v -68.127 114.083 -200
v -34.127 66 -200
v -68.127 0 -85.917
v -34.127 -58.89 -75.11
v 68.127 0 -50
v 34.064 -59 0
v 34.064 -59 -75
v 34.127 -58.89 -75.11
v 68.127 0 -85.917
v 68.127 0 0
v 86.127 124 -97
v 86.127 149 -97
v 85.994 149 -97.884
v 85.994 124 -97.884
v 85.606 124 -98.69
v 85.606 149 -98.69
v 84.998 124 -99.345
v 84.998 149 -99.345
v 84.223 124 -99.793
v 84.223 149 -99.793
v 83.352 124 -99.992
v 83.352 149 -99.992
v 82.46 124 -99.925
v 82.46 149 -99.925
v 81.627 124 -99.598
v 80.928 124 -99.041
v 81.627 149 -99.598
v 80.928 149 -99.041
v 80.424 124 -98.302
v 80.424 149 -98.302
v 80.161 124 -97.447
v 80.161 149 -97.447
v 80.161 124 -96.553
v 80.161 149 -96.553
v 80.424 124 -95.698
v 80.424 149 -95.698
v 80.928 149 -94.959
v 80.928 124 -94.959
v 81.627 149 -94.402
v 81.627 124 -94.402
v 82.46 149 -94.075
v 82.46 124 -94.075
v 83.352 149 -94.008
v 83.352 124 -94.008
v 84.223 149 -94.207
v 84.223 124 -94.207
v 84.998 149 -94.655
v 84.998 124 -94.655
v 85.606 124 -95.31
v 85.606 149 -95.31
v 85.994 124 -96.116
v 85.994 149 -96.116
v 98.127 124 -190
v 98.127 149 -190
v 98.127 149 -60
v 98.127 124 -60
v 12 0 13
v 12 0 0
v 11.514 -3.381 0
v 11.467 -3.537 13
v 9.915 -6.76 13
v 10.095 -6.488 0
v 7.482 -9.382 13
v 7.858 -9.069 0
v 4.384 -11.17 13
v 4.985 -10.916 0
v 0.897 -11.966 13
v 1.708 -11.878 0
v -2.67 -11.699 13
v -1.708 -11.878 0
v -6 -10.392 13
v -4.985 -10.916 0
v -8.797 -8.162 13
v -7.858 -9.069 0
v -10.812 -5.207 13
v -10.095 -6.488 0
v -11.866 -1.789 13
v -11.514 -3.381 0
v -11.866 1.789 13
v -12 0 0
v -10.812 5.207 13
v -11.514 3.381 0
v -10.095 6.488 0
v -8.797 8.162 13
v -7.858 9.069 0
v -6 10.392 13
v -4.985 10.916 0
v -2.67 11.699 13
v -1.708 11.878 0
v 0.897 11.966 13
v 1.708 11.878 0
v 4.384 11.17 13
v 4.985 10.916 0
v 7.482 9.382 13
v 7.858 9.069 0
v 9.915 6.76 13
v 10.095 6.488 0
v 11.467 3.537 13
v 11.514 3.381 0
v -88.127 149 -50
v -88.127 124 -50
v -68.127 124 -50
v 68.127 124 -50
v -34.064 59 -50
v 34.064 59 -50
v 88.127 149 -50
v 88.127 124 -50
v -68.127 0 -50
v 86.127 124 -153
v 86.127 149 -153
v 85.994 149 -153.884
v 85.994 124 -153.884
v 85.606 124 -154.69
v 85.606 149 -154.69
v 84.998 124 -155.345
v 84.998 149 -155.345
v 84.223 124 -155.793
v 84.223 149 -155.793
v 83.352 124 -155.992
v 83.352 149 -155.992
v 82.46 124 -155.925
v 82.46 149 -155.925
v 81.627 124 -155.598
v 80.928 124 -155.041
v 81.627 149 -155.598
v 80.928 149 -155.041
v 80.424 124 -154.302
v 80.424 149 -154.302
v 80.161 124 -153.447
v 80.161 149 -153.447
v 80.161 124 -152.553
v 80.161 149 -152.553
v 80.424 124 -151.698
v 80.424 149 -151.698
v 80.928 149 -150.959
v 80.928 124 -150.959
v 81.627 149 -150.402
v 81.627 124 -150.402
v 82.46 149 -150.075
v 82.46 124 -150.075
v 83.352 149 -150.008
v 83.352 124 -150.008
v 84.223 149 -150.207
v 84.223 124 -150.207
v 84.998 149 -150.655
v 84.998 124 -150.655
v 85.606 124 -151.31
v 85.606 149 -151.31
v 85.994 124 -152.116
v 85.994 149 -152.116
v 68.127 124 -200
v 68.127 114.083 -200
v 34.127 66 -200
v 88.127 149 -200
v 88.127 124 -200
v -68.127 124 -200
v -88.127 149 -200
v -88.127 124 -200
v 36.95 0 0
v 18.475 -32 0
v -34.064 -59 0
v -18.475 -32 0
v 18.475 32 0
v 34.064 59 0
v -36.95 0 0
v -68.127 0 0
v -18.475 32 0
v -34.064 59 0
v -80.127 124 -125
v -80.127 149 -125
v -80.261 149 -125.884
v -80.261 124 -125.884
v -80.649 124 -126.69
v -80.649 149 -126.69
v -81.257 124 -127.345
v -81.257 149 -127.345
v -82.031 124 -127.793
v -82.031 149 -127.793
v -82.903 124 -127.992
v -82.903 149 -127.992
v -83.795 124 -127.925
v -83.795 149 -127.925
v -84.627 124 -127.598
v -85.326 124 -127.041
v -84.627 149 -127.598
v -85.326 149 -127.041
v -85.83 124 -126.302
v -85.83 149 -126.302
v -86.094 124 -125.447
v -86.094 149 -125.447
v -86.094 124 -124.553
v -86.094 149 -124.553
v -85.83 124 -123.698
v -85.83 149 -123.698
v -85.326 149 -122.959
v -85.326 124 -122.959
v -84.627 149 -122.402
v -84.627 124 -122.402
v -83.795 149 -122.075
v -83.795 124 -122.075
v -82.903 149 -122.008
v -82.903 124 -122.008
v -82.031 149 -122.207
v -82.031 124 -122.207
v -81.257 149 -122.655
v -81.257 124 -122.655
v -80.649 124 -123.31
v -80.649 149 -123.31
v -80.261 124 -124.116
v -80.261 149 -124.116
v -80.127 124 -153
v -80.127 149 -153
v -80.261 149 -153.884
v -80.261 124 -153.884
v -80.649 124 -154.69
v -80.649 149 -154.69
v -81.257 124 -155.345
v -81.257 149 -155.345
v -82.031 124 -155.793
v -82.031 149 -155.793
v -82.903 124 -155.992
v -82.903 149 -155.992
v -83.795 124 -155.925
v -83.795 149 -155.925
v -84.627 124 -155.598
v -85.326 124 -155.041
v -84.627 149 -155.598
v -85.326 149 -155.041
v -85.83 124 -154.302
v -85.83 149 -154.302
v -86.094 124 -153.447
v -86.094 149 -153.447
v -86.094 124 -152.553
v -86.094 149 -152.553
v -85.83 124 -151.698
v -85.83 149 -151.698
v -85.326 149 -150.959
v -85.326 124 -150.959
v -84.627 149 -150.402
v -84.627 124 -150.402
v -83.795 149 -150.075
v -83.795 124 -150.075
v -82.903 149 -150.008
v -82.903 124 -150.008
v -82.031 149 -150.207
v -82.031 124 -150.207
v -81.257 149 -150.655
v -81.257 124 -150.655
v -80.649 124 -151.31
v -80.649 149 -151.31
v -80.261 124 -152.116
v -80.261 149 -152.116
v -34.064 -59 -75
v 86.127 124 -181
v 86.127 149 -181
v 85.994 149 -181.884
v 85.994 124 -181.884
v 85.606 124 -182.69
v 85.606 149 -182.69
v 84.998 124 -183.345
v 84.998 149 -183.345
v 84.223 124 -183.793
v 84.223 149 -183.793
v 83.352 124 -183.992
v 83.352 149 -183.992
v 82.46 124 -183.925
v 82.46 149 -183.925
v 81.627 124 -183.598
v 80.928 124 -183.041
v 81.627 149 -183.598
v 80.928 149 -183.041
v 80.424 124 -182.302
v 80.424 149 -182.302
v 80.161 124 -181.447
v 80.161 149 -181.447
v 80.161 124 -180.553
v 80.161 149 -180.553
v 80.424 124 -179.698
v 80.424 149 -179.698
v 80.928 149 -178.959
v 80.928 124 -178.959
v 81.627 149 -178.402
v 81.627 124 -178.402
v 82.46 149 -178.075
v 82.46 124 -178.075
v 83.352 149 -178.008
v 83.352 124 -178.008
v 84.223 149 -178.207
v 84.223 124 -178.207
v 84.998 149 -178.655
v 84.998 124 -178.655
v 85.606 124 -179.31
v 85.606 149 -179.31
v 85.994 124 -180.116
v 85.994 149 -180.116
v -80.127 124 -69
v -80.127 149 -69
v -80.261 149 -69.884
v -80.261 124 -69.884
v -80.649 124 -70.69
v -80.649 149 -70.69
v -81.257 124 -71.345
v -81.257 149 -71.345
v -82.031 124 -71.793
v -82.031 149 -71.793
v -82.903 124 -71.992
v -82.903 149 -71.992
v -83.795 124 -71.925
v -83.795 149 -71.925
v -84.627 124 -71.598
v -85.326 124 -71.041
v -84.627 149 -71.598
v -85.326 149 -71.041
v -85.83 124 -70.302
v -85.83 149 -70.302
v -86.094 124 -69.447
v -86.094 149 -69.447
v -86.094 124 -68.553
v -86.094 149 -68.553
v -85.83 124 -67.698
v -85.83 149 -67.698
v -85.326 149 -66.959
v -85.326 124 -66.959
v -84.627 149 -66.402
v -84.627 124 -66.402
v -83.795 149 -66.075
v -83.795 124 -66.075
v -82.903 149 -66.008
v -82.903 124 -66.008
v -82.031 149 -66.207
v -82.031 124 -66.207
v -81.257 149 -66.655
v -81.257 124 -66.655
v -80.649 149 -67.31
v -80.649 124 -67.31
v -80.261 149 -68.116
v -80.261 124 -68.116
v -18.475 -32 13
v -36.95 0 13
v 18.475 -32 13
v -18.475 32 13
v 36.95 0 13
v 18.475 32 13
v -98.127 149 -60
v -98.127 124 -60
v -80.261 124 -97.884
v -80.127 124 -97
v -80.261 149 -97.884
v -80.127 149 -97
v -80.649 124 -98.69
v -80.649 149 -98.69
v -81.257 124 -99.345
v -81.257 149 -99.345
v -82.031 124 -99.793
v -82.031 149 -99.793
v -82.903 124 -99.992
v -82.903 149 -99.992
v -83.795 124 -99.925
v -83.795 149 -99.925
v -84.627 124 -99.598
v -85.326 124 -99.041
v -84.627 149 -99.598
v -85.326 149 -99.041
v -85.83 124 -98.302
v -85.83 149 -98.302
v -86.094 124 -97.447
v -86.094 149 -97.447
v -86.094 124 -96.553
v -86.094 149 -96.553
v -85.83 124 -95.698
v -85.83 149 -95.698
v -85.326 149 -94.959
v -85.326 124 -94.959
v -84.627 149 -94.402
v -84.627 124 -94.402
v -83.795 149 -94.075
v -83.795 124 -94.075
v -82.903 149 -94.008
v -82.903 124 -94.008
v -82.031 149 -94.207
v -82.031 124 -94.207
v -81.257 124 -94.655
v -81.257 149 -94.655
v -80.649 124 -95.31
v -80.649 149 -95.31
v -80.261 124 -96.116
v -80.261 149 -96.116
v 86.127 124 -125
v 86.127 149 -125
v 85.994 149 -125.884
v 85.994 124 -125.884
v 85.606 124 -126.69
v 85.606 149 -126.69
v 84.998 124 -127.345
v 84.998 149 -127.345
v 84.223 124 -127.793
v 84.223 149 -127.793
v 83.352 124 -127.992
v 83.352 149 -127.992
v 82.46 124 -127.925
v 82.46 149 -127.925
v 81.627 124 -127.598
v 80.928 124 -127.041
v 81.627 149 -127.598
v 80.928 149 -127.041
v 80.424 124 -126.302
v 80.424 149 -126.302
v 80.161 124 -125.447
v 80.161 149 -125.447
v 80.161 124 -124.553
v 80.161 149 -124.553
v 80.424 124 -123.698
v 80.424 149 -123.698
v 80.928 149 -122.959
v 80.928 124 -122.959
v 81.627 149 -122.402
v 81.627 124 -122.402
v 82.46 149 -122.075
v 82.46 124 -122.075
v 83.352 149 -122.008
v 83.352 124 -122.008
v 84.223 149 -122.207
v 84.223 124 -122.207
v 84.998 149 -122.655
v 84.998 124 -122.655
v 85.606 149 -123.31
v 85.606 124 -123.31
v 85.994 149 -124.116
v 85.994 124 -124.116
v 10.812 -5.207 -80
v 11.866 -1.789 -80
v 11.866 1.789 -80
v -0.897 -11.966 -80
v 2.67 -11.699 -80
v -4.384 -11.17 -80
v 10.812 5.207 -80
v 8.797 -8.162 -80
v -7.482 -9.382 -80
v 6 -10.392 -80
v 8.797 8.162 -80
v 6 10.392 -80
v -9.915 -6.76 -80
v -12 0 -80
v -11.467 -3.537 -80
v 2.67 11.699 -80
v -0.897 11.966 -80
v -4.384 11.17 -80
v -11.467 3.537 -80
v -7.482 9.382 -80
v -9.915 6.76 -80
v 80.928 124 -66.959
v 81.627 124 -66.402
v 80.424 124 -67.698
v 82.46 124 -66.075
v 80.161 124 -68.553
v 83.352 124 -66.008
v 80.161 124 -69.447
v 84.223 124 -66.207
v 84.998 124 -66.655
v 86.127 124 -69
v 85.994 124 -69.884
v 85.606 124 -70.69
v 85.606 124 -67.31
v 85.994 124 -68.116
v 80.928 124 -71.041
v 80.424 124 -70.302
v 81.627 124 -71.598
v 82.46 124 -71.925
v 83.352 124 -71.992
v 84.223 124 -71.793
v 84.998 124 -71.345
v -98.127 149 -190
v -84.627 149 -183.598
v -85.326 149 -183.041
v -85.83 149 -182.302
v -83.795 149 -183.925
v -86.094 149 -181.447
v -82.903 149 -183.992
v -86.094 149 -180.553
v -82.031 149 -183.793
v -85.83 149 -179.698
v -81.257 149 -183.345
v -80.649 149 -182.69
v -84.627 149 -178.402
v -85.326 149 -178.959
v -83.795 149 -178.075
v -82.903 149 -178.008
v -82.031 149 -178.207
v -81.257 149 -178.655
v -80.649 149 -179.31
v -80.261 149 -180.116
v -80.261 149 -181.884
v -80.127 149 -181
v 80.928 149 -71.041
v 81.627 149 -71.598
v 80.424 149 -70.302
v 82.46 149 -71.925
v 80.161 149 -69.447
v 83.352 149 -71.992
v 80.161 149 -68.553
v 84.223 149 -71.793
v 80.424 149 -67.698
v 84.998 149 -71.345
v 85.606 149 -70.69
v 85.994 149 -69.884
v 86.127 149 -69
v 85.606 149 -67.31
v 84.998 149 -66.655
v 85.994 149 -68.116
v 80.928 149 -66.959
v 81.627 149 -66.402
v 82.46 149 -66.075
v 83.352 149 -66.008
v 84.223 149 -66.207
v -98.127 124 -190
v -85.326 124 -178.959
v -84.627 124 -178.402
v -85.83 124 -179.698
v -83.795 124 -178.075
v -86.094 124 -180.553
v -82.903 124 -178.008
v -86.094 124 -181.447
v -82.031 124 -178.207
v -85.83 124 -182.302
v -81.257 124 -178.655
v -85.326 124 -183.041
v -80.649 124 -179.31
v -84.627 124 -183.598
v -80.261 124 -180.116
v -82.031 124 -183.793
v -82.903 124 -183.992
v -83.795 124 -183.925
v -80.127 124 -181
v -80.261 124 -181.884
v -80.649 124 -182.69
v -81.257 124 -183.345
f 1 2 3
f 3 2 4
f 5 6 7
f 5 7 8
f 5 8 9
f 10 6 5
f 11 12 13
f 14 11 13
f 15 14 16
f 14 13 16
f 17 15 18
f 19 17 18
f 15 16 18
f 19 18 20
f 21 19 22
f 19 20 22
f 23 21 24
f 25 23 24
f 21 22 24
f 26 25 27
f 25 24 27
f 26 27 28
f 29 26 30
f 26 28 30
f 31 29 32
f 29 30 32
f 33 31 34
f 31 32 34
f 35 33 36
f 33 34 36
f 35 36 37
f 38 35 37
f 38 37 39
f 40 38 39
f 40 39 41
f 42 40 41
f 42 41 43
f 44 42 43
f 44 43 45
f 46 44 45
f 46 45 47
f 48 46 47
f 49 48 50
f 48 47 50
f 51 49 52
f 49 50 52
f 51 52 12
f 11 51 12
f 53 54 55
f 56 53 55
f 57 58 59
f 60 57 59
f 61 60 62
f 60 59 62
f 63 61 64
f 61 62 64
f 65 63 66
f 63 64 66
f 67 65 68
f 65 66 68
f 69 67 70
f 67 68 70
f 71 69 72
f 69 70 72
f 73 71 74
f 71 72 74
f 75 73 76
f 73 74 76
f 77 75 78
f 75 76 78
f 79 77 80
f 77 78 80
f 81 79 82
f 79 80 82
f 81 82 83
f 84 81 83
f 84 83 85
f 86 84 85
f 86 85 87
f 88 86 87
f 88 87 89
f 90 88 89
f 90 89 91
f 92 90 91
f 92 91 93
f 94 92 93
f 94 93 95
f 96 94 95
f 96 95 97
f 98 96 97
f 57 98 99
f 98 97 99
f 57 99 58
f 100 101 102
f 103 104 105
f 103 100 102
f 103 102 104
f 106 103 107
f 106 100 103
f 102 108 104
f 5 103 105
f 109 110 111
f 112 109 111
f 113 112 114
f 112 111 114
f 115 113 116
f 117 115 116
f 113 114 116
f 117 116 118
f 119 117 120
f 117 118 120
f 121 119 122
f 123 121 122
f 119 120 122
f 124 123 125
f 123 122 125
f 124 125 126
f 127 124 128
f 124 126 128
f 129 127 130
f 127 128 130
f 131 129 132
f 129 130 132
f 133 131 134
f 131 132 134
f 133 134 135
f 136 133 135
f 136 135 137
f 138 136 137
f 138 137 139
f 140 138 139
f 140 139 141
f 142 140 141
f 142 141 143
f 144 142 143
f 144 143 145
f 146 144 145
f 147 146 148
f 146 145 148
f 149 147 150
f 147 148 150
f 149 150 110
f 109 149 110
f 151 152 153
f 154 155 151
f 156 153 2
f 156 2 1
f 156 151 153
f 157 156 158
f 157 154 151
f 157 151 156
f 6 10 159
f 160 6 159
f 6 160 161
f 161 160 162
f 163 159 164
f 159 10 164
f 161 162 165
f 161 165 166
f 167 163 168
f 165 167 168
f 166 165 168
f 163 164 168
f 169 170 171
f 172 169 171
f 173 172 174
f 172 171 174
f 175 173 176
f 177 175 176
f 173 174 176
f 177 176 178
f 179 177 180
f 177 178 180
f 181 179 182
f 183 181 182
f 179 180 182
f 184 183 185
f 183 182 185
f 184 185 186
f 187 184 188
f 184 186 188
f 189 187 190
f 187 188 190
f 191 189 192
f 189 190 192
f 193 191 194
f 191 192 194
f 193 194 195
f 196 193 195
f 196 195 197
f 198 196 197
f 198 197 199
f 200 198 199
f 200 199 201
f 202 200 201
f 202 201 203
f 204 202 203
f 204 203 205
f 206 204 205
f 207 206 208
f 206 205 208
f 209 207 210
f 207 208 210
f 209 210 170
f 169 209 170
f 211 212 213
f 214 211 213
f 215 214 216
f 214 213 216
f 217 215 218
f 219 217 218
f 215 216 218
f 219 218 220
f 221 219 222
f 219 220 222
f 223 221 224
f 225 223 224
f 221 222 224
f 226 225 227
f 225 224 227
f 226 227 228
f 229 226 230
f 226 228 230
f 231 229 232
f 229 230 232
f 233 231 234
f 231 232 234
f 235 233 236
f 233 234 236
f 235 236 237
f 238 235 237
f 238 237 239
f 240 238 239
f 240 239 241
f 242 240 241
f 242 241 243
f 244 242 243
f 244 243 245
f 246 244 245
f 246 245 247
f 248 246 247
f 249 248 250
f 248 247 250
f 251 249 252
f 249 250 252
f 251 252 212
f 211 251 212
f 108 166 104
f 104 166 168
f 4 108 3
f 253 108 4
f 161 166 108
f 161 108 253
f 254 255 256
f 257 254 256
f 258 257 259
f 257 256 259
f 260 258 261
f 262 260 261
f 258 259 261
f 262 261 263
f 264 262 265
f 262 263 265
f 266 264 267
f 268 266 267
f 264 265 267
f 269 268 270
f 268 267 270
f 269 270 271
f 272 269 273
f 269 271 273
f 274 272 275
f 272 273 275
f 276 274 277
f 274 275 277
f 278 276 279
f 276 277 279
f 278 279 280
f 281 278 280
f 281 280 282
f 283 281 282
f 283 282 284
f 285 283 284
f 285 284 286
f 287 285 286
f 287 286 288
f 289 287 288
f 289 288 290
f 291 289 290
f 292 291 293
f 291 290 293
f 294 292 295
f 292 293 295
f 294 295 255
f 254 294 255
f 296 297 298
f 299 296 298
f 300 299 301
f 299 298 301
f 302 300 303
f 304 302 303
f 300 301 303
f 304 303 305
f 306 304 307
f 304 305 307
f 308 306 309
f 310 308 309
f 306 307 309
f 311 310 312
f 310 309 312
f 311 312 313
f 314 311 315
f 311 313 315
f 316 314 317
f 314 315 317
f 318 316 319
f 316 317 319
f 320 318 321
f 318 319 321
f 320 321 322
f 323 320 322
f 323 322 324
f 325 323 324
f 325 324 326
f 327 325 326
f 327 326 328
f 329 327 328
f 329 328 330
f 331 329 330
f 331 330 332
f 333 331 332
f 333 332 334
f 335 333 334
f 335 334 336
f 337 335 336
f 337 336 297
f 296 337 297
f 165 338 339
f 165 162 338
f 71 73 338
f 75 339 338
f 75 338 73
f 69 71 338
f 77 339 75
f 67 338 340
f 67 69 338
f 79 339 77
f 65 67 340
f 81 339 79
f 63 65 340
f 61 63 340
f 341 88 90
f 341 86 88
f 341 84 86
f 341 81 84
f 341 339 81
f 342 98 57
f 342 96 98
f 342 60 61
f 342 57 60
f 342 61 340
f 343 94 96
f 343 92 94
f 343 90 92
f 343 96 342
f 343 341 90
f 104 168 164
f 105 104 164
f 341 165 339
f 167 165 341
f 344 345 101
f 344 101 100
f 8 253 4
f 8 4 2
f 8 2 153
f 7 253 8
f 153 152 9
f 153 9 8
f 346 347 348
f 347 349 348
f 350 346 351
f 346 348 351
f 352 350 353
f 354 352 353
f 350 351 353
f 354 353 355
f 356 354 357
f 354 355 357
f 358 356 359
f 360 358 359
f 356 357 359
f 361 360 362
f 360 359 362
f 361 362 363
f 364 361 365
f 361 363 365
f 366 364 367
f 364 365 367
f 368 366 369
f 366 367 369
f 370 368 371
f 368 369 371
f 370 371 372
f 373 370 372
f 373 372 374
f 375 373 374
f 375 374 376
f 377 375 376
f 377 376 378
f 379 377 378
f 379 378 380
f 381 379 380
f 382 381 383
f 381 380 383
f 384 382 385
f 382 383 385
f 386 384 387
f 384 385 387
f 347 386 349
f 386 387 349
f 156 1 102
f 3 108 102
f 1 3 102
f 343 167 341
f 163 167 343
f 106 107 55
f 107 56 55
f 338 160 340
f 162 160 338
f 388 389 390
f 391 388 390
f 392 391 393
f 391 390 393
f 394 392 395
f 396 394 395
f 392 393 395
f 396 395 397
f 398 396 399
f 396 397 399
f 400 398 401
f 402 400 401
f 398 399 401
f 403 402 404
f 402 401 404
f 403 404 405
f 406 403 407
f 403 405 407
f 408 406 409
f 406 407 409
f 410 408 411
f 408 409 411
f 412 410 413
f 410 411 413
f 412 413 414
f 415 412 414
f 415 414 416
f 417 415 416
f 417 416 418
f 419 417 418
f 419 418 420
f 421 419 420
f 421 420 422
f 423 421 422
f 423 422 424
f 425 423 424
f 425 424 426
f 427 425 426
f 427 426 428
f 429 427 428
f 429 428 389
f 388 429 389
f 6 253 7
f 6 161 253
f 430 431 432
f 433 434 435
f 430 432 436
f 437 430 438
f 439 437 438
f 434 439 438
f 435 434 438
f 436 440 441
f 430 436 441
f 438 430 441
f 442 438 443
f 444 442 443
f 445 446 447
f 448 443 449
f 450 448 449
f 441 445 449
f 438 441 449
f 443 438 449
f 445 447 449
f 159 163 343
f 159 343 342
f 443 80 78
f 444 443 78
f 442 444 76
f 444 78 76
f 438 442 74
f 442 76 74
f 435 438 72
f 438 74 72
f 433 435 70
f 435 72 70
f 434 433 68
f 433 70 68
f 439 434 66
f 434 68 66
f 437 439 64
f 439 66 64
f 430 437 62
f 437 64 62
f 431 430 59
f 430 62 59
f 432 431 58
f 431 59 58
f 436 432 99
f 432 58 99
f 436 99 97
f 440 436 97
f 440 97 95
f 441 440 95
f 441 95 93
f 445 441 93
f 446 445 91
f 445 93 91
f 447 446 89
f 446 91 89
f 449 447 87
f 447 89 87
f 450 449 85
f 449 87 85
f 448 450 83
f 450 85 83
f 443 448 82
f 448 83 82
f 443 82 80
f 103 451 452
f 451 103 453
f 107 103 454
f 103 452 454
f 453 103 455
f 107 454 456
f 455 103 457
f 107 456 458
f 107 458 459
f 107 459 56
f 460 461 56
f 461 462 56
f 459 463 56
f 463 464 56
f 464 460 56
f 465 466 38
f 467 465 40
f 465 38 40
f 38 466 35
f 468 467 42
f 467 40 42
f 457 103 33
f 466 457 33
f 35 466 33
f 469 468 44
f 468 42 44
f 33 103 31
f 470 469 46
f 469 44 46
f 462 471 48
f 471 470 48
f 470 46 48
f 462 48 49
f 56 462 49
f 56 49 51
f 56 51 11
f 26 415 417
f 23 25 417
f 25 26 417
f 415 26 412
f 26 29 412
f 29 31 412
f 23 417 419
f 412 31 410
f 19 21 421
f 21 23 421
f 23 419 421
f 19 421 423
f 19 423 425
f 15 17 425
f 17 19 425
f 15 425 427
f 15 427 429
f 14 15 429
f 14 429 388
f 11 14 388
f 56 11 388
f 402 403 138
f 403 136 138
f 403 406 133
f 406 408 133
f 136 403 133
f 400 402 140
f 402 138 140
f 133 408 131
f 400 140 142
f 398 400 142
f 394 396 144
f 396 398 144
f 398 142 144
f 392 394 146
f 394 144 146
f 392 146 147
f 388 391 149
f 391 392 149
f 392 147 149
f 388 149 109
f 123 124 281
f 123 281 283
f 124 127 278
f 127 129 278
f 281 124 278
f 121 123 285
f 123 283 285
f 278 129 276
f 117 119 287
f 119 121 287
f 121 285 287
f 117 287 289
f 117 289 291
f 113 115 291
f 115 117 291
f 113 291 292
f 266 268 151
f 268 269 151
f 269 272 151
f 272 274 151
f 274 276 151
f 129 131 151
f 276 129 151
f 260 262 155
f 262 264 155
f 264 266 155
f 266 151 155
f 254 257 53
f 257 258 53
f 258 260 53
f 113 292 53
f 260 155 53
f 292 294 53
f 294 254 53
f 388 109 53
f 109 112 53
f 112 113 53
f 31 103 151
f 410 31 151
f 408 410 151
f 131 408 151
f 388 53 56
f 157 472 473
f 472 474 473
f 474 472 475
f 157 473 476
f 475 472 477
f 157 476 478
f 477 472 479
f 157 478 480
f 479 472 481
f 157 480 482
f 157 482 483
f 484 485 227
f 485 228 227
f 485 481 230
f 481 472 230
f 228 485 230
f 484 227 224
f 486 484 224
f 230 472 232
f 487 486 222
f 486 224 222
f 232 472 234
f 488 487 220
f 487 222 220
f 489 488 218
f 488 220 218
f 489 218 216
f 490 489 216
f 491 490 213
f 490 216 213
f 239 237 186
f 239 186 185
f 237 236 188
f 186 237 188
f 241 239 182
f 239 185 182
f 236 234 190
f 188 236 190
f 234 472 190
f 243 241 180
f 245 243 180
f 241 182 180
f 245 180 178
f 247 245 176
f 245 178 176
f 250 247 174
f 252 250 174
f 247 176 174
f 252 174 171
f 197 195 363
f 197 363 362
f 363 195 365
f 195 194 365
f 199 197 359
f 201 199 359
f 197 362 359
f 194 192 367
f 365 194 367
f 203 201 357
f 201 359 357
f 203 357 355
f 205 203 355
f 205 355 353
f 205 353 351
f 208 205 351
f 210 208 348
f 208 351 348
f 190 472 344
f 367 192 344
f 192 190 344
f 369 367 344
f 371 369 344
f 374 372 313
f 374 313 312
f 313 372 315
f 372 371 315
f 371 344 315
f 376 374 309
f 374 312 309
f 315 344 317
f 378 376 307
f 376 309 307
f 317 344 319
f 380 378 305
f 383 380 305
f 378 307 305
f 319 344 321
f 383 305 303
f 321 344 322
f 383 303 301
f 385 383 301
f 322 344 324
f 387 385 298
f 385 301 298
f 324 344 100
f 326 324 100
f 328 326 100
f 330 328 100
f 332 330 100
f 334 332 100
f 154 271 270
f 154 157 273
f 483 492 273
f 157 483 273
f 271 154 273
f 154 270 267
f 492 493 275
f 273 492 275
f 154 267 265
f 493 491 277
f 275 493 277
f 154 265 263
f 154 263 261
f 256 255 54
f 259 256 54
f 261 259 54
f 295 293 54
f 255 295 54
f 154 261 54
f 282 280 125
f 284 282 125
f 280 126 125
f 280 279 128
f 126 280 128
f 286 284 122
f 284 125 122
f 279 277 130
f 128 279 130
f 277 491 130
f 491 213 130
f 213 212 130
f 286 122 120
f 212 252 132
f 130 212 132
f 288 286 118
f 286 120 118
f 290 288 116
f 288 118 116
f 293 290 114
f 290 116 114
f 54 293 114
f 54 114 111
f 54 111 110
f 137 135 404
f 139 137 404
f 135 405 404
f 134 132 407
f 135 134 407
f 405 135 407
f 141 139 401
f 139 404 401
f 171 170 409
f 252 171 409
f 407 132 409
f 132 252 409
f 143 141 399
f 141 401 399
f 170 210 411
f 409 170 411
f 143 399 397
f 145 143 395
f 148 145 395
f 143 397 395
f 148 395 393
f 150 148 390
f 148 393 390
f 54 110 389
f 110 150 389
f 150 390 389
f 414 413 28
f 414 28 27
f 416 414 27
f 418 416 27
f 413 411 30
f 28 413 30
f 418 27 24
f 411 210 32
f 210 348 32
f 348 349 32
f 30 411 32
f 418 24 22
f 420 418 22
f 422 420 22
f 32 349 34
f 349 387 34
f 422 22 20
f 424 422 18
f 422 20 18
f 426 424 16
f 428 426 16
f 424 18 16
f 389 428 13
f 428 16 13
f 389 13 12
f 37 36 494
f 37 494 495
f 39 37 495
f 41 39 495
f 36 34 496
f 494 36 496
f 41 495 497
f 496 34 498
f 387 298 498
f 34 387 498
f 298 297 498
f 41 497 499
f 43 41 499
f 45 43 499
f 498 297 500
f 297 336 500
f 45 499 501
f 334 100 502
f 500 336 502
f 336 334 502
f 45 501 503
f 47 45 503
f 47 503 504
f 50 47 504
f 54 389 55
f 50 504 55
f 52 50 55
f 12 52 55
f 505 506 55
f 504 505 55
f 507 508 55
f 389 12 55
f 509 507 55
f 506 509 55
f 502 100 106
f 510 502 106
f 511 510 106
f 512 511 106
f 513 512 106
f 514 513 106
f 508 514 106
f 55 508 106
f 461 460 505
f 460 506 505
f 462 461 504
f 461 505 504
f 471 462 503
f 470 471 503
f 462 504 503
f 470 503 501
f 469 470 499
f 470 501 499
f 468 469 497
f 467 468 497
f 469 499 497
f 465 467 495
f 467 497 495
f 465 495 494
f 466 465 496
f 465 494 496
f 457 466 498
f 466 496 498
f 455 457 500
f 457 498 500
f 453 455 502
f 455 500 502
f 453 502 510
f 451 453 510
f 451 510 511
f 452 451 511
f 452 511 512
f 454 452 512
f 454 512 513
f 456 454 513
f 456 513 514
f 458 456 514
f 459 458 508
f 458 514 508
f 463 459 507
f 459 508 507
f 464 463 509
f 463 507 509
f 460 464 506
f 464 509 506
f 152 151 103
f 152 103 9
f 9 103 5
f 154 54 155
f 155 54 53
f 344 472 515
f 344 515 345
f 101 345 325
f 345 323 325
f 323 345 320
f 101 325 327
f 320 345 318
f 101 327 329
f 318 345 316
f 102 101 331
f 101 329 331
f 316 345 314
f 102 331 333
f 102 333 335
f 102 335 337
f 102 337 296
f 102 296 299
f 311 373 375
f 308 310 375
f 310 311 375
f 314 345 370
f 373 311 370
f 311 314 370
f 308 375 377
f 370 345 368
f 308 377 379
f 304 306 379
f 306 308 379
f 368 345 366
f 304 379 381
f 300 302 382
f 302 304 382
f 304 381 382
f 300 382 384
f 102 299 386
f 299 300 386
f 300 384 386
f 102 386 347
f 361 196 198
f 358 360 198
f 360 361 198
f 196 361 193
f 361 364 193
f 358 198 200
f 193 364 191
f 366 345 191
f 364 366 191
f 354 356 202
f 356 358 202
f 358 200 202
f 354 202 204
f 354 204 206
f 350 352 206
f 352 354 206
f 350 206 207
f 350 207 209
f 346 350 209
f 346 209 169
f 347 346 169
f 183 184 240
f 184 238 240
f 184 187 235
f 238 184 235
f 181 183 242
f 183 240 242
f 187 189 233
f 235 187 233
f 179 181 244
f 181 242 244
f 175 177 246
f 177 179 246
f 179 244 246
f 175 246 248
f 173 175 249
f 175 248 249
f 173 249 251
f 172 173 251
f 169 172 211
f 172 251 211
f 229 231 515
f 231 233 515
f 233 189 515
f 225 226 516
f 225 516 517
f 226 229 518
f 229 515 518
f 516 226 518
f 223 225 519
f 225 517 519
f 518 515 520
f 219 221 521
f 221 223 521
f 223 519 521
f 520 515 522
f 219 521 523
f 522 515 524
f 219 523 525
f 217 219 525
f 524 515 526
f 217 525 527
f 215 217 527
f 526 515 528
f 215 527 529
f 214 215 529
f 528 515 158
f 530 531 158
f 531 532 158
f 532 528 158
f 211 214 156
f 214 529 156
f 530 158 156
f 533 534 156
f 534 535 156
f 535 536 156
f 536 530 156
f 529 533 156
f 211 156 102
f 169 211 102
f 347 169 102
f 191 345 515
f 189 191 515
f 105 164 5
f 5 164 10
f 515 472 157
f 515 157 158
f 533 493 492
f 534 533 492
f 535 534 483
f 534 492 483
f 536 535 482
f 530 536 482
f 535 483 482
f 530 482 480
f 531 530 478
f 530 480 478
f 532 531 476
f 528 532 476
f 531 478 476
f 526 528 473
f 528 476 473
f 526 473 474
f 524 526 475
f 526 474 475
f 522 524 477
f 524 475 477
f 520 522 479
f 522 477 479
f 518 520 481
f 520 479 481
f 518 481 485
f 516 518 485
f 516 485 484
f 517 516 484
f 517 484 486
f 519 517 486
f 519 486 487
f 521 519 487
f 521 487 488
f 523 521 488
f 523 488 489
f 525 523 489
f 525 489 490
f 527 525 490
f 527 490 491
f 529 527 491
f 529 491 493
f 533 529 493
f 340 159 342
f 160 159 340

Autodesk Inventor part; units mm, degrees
ref_plane "YZ Plane" through (0, 0, 0) normal (1, 0, 0) x (0, 1, 0)
ref_plane "XZ Plane" through (0, 0, 0) normal (0, 1, 0) x (-1, 0, 0)
ref_plane "XY Plane" through (0, 0, 0) normal (0, 0, 1) x (1, 0, 0)
sketch "Sketch1" plane through (0, 0, 0) normal (0, 0, 1) x (1, 0, 0)
  line L0 (-36.9504, 0) -> (-18.4752, 32)
  line L1 (-18.4752, 32) -> (18.4752, 32)
  line L2 (18.4752, 32) -> (36.9504, 0)
  line L3 (36.9504, 0) -> (18.4752, -32)
  line L4 (18.4752, -32) -> (-18.4752, -32)
  line L5 (-18.4752, -32) -> (-36.9504, 0)
  circle A0 centre (0, 0) radius 12
  dimension "d0" = 64
  dimension "d1" = 24
extrude "Extrusion1" add sketch "Sketch1" along normal blind 13
sketch "Sketch2" plane through (0, 0, 0) normal (0, 0, -1) x (-1, 0, 0)
  line L0 (68.1273, 0) -> (34.0637, -59)
  line L1 (34.0637, -59) -> (-34.0637, -59)
  line L2 (-34.0637, -59) -> (-68.1273, 0)
  line L3 (-68.1273, 0) -> (-34.0637, 59)
  line L4 (-34.0637, 59) -> (34.0637, 59)
  line L5 (34.0637, 59) -> (68.1273, 0)
  circle A0 centre (0, 0) radius 12 projected
  line L6 (68.1273, 0) -> (68.1273, 149)
  line L7 (68.1273, 149) -> (-68.1273, 149)
  line L8 (-68.1273, 149) -> (-68.1273, 0)
  dimension "d4" = 118
  dimension "d8" = 90
extrude "Extrusion2" add sketch "Sketch2" along normal blind 200
sketch "Sketch3" plane through (0, 0, -200) normal (0, 0, -1) x (-1, 0, 0)
  circle A0 centre (0, 0) radius 12 projected
extrude "Extrusion3" add sketch "Sketch3" against normal blind 120
sketch "Sketch4" plane through (0, 0, 0) normal (0, 0, 1) x (1, 0, 0)
  line L0 (68.1273, 0) -> (34.0637, -59)
  line L1 (34.0637, -59) -> (-34.0637, -59) construction
  line L2 (-34.0637, -59) -> (-68.1273, 0)
  line L3 (-68.1273, 0) -> (-34.0637, 59)
  line L4 (-34.0637, 59) -> (34.0637, 59)
  line L5 (34.0637, 59) -> (68.1273, 0)
  line L6 (68.1273, 0) -> (34.0637, -59) projected
  line L7 (68.1273, 149) -> (68.1273, 0) projected
  line L8 (68.1273, 0) -> (68.1273, 149)
  line L9 (-68.1273, 149) -> (68.1273, 149) projected
  line L10 (68.1273, 149) -> (-68.1273, 149)
  line L11 (-68.1273, 149) -> (-68.1273, 0)
  point P0 (0, 0)
  point P1 (0, 0)
extrude "Extrusion4" cut sketch "Sketch4" against normal blind 50
chamfer "Chamfer1" distance 125 angle 45 1 edges at (0, -59, -200)
chamfer "Chamfer2" distance 34 angle 45 2 edges at (-68.1273, 33, -167) (68.1273, 33, -167)
sketch "Sketch5" plane through (-68.1273, 149, -200) normal (0, 1, 0) x (1, 0, 0)
  line L0 (0, -150) -> (0, 0) projected
  line L1 (0, 0) -> (-30, 0)
  line L2 (-30, 0) -> (-30, -150)
  line L3 (-30, -150) -> (0, -150)
  line L4 (0, -150) -> (0, 0)
  line L5 (0, 0) -> (136.2547, 0) projected
  line L6 (136.2547, 0) -> (166.2547, 0)
  line L7 (166.2547, 0) -> (166.2547, -150)
  line L8 (166.2547, -150) -> (136.2547, -150)
  line L9 (136.2547, -150) -> (136.2547, 0)
  circle A0 centre (151.2547, -131) radius 3
  circle A1 centre (151.2547, -103) radius 3
  circle A2 centre (151.2547, -75) radius 3
  circle A3 centre (151.2547, -47) radius 3
  circle A4 centre (151.2547, -19) radius 3
  line L10 (68.1273, -200) -> (68.1273, -239.5833)
  line L11 (0, 0) -> (-30, 0)
  line L12 (-30, 0) -> (-30, -150)
  line L13 (-30, -150) -> (0, -150)
  line L14 (0, -150) -> (0, 0)
  circle A5 centre (-15, -131) radius 3
  circle A6 centre (-15, -103) radius 3
  circle A7 centre (-15, -75) radius 3
  circle A8 centre (-15, -47) radius 3
  circle A9 centre (-15, -19) radius 3
  point P0 (151.2547, -150)
  point P1 (0, -150)
  point P2 (-15, -150)
  dimension "d19" = 30
  dimension "d20" = 30
  dimension "d21" = 6
  dimension "d22" = 19
  dimension "d25" = 28
extrude "Extrusion5" add sketch "Sketch5" against normal blind 25
chamfer "Chamfer4" distance 10 angle 45 4 edges at (98.1273, 136.5, -50) (-98.1273, 136.5, -50) (98.1273, 136.5, -200) (-98.1273, 136.5, -200)
properties part number "BA30" material "ABS Plastic"
